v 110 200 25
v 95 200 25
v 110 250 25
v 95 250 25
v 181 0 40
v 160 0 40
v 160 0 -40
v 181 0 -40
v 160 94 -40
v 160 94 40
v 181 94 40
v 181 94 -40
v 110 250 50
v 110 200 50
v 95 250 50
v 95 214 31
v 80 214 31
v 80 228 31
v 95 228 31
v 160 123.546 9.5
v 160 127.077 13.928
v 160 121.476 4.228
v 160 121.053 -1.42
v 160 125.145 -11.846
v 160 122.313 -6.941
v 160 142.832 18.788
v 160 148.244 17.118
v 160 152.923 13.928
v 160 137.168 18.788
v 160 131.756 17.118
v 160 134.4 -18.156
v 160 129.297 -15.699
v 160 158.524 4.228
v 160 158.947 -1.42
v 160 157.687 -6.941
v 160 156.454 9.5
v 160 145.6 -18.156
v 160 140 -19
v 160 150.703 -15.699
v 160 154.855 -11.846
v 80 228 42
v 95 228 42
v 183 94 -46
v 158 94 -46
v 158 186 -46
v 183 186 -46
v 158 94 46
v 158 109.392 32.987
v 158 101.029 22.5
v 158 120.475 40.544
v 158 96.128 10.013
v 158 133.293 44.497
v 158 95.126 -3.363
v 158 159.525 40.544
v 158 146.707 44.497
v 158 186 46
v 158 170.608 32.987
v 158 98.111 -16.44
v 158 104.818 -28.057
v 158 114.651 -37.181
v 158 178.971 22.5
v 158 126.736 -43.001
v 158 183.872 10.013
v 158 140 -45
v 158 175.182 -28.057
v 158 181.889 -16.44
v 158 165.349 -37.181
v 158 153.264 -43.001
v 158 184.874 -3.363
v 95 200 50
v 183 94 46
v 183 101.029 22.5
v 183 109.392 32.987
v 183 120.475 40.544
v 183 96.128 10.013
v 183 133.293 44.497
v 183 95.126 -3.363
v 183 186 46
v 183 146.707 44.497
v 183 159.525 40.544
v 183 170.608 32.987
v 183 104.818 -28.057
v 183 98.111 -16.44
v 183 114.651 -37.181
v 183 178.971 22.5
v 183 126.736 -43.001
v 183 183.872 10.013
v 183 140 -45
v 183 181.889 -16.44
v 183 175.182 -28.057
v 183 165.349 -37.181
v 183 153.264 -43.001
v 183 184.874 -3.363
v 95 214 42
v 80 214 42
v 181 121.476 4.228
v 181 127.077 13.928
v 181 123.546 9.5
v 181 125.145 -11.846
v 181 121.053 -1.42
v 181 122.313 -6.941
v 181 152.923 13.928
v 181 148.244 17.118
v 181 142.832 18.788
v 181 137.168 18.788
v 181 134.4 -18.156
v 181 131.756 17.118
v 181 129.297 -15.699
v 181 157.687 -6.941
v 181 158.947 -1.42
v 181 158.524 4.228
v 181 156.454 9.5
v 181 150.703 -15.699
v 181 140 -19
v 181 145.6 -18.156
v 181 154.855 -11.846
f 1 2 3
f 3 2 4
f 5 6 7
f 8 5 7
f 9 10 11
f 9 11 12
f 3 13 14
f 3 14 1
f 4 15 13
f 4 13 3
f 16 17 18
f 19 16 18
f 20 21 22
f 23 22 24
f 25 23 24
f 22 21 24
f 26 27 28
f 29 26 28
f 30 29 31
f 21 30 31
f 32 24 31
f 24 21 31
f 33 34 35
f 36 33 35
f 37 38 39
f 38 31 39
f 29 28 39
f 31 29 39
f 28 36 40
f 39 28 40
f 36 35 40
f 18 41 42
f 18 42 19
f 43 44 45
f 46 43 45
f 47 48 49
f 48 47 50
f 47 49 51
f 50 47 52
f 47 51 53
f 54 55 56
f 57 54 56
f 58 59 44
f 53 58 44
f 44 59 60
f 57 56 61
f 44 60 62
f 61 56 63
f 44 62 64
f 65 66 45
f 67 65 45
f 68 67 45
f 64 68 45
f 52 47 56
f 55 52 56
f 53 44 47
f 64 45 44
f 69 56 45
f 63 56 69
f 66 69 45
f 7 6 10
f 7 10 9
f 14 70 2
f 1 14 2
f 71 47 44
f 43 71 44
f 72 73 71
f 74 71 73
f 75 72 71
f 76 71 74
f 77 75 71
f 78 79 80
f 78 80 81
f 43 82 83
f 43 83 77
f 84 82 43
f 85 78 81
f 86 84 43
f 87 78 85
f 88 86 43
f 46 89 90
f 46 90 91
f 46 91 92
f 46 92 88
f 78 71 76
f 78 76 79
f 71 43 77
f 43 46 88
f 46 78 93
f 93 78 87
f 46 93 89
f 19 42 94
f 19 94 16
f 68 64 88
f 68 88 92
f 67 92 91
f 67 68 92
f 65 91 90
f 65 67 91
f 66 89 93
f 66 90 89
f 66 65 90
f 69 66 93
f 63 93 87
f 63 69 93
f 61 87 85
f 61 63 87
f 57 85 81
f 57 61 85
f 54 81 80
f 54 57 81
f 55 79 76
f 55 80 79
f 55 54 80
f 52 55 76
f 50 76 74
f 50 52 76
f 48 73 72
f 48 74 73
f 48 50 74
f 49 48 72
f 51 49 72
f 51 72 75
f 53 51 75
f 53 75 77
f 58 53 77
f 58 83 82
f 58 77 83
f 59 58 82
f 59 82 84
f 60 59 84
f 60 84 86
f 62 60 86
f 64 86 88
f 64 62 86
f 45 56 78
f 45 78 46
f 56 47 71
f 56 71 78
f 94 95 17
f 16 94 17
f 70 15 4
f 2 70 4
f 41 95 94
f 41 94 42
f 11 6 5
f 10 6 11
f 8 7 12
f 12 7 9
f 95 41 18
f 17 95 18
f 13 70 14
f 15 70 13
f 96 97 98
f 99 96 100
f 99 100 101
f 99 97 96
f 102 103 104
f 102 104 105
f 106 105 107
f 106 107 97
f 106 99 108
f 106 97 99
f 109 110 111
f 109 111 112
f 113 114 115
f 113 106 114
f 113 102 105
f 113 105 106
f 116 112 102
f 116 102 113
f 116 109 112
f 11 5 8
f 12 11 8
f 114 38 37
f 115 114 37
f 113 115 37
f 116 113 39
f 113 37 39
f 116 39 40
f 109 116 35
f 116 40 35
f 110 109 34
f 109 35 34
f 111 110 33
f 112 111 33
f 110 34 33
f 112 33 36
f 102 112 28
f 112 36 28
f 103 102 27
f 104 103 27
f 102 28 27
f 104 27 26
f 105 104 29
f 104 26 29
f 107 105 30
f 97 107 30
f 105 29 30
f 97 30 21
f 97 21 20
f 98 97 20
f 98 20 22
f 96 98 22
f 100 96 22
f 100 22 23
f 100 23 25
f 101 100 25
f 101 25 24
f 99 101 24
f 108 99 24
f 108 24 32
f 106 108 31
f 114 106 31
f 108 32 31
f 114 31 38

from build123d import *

# Parameters (mm, degrees)
FRAME_START         = 158
SKETCH1_W           = 92
SKETCH1_H           = 92
FRAME_DEPTH         = 25
BORE_START          = 157
SKETCH2_R           = 45
BORE_DEPTH          = 27
HUB_START           = 160
SKETCH3_R           = 19
HUB_DEPTH           = 21
FAN_STAND_START     = 160
SKETCH4_W           = 80
SKETCH4_H           = 94
FAN_STAND_DEPTH     = 21
BLOWER_50MM_START   = 95
SKETCH5_W           = 25
SKETCH5_H           = 50
BLOWER_50MM_DEPTH   = 15
BLOWER_NOZZLE_START = 80
SKETCH6_W           = 11
SKETCH6_H           = 14
BLOWER_NOZZLE_DEPTH = 15


with BuildPart() as part:
    # Sketch1 → frame (new body)
    with BuildSketch(Plane(origin=(0, 0, 0), x_dir=(0, 0, -1), z_dir=(1, 0, 0)).offset(FRAME_START)):
        with Locations((0, 140)):
            Rectangle(SKETCH1_W, SKETCH1_H)
    extrude(amount=FRAME_DEPTH)


with BuildPart() as body_2:
    # Sketch2 → bore (new body)
    with BuildSketch(Plane(origin=(0, 0, 0), x_dir=(0, 0, -1), z_dir=(1, 0, 0)).offset(BORE_START)):
        with Locations((0, 140)):
            Circle(SKETCH2_R)
    extrude(amount=BORE_DEPTH)


with BuildPart() as part_1:
    add(part.part)

    # Combine1: cut body 2
    add(body_2.part, mode=Mode.SUBTRACT)


with BuildPart() as body_2_2:
    # Sketch3 → hub (new body)
    with BuildSketch(Plane(origin=(0, 0, 0), x_dir=(0, 0, -1), z_dir=(1, 0, 0)).offset(HUB_START)):
        with Locations((0, 140)):
            Circle(SKETCH3_R)
    extrude(amount=HUB_DEPTH)


with BuildPart() as body_3:
    # Sketch4 → fan_stand (new body)
    with BuildSketch(Plane(origin=(0, 0, 0), x_dir=(0, 0, -1), z_dir=(1, 0, 0)).offset(FAN_STAND_START)):
        with Locations((0, 47)):
            Rectangle(SKETCH4_W, SKETCH4_H)
    extrude(amount=FAN_STAND_DEPTH)


with BuildPart() as body_4:
    # Sketch5 → blower_50mm (new body)
    with BuildSketch(Plane(origin=(0, 0, 0), x_dir=(0, 0, -1), z_dir=(1, 0, 0)).offset(BLOWER_50MM_START)):
        with Locations((-37.5, 225)):
            Rectangle(SKETCH5_W, SKETCH5_H)
    extrude(amount=BLOWER_50MM_DEPTH)


with BuildPart() as body_5:
    # Sketch6 → blower_nozzle (new body)
    with BuildSketch(Plane(origin=(0, 0, 0), x_dir=(0, 0, -1), z_dir=(1, 0, 0)).offset(BLOWER_NOZZLE_START)):
        with Locations((-36.5, 221)):
            Rectangle(SKETCH6_W, SKETCH6_H)
    extrude(amount=BLOWER_NOZZLE_DEPTH)


solid = Compound([part_1.part, body_2_2.part, body_3.part, body_4.part, body_5.part])
